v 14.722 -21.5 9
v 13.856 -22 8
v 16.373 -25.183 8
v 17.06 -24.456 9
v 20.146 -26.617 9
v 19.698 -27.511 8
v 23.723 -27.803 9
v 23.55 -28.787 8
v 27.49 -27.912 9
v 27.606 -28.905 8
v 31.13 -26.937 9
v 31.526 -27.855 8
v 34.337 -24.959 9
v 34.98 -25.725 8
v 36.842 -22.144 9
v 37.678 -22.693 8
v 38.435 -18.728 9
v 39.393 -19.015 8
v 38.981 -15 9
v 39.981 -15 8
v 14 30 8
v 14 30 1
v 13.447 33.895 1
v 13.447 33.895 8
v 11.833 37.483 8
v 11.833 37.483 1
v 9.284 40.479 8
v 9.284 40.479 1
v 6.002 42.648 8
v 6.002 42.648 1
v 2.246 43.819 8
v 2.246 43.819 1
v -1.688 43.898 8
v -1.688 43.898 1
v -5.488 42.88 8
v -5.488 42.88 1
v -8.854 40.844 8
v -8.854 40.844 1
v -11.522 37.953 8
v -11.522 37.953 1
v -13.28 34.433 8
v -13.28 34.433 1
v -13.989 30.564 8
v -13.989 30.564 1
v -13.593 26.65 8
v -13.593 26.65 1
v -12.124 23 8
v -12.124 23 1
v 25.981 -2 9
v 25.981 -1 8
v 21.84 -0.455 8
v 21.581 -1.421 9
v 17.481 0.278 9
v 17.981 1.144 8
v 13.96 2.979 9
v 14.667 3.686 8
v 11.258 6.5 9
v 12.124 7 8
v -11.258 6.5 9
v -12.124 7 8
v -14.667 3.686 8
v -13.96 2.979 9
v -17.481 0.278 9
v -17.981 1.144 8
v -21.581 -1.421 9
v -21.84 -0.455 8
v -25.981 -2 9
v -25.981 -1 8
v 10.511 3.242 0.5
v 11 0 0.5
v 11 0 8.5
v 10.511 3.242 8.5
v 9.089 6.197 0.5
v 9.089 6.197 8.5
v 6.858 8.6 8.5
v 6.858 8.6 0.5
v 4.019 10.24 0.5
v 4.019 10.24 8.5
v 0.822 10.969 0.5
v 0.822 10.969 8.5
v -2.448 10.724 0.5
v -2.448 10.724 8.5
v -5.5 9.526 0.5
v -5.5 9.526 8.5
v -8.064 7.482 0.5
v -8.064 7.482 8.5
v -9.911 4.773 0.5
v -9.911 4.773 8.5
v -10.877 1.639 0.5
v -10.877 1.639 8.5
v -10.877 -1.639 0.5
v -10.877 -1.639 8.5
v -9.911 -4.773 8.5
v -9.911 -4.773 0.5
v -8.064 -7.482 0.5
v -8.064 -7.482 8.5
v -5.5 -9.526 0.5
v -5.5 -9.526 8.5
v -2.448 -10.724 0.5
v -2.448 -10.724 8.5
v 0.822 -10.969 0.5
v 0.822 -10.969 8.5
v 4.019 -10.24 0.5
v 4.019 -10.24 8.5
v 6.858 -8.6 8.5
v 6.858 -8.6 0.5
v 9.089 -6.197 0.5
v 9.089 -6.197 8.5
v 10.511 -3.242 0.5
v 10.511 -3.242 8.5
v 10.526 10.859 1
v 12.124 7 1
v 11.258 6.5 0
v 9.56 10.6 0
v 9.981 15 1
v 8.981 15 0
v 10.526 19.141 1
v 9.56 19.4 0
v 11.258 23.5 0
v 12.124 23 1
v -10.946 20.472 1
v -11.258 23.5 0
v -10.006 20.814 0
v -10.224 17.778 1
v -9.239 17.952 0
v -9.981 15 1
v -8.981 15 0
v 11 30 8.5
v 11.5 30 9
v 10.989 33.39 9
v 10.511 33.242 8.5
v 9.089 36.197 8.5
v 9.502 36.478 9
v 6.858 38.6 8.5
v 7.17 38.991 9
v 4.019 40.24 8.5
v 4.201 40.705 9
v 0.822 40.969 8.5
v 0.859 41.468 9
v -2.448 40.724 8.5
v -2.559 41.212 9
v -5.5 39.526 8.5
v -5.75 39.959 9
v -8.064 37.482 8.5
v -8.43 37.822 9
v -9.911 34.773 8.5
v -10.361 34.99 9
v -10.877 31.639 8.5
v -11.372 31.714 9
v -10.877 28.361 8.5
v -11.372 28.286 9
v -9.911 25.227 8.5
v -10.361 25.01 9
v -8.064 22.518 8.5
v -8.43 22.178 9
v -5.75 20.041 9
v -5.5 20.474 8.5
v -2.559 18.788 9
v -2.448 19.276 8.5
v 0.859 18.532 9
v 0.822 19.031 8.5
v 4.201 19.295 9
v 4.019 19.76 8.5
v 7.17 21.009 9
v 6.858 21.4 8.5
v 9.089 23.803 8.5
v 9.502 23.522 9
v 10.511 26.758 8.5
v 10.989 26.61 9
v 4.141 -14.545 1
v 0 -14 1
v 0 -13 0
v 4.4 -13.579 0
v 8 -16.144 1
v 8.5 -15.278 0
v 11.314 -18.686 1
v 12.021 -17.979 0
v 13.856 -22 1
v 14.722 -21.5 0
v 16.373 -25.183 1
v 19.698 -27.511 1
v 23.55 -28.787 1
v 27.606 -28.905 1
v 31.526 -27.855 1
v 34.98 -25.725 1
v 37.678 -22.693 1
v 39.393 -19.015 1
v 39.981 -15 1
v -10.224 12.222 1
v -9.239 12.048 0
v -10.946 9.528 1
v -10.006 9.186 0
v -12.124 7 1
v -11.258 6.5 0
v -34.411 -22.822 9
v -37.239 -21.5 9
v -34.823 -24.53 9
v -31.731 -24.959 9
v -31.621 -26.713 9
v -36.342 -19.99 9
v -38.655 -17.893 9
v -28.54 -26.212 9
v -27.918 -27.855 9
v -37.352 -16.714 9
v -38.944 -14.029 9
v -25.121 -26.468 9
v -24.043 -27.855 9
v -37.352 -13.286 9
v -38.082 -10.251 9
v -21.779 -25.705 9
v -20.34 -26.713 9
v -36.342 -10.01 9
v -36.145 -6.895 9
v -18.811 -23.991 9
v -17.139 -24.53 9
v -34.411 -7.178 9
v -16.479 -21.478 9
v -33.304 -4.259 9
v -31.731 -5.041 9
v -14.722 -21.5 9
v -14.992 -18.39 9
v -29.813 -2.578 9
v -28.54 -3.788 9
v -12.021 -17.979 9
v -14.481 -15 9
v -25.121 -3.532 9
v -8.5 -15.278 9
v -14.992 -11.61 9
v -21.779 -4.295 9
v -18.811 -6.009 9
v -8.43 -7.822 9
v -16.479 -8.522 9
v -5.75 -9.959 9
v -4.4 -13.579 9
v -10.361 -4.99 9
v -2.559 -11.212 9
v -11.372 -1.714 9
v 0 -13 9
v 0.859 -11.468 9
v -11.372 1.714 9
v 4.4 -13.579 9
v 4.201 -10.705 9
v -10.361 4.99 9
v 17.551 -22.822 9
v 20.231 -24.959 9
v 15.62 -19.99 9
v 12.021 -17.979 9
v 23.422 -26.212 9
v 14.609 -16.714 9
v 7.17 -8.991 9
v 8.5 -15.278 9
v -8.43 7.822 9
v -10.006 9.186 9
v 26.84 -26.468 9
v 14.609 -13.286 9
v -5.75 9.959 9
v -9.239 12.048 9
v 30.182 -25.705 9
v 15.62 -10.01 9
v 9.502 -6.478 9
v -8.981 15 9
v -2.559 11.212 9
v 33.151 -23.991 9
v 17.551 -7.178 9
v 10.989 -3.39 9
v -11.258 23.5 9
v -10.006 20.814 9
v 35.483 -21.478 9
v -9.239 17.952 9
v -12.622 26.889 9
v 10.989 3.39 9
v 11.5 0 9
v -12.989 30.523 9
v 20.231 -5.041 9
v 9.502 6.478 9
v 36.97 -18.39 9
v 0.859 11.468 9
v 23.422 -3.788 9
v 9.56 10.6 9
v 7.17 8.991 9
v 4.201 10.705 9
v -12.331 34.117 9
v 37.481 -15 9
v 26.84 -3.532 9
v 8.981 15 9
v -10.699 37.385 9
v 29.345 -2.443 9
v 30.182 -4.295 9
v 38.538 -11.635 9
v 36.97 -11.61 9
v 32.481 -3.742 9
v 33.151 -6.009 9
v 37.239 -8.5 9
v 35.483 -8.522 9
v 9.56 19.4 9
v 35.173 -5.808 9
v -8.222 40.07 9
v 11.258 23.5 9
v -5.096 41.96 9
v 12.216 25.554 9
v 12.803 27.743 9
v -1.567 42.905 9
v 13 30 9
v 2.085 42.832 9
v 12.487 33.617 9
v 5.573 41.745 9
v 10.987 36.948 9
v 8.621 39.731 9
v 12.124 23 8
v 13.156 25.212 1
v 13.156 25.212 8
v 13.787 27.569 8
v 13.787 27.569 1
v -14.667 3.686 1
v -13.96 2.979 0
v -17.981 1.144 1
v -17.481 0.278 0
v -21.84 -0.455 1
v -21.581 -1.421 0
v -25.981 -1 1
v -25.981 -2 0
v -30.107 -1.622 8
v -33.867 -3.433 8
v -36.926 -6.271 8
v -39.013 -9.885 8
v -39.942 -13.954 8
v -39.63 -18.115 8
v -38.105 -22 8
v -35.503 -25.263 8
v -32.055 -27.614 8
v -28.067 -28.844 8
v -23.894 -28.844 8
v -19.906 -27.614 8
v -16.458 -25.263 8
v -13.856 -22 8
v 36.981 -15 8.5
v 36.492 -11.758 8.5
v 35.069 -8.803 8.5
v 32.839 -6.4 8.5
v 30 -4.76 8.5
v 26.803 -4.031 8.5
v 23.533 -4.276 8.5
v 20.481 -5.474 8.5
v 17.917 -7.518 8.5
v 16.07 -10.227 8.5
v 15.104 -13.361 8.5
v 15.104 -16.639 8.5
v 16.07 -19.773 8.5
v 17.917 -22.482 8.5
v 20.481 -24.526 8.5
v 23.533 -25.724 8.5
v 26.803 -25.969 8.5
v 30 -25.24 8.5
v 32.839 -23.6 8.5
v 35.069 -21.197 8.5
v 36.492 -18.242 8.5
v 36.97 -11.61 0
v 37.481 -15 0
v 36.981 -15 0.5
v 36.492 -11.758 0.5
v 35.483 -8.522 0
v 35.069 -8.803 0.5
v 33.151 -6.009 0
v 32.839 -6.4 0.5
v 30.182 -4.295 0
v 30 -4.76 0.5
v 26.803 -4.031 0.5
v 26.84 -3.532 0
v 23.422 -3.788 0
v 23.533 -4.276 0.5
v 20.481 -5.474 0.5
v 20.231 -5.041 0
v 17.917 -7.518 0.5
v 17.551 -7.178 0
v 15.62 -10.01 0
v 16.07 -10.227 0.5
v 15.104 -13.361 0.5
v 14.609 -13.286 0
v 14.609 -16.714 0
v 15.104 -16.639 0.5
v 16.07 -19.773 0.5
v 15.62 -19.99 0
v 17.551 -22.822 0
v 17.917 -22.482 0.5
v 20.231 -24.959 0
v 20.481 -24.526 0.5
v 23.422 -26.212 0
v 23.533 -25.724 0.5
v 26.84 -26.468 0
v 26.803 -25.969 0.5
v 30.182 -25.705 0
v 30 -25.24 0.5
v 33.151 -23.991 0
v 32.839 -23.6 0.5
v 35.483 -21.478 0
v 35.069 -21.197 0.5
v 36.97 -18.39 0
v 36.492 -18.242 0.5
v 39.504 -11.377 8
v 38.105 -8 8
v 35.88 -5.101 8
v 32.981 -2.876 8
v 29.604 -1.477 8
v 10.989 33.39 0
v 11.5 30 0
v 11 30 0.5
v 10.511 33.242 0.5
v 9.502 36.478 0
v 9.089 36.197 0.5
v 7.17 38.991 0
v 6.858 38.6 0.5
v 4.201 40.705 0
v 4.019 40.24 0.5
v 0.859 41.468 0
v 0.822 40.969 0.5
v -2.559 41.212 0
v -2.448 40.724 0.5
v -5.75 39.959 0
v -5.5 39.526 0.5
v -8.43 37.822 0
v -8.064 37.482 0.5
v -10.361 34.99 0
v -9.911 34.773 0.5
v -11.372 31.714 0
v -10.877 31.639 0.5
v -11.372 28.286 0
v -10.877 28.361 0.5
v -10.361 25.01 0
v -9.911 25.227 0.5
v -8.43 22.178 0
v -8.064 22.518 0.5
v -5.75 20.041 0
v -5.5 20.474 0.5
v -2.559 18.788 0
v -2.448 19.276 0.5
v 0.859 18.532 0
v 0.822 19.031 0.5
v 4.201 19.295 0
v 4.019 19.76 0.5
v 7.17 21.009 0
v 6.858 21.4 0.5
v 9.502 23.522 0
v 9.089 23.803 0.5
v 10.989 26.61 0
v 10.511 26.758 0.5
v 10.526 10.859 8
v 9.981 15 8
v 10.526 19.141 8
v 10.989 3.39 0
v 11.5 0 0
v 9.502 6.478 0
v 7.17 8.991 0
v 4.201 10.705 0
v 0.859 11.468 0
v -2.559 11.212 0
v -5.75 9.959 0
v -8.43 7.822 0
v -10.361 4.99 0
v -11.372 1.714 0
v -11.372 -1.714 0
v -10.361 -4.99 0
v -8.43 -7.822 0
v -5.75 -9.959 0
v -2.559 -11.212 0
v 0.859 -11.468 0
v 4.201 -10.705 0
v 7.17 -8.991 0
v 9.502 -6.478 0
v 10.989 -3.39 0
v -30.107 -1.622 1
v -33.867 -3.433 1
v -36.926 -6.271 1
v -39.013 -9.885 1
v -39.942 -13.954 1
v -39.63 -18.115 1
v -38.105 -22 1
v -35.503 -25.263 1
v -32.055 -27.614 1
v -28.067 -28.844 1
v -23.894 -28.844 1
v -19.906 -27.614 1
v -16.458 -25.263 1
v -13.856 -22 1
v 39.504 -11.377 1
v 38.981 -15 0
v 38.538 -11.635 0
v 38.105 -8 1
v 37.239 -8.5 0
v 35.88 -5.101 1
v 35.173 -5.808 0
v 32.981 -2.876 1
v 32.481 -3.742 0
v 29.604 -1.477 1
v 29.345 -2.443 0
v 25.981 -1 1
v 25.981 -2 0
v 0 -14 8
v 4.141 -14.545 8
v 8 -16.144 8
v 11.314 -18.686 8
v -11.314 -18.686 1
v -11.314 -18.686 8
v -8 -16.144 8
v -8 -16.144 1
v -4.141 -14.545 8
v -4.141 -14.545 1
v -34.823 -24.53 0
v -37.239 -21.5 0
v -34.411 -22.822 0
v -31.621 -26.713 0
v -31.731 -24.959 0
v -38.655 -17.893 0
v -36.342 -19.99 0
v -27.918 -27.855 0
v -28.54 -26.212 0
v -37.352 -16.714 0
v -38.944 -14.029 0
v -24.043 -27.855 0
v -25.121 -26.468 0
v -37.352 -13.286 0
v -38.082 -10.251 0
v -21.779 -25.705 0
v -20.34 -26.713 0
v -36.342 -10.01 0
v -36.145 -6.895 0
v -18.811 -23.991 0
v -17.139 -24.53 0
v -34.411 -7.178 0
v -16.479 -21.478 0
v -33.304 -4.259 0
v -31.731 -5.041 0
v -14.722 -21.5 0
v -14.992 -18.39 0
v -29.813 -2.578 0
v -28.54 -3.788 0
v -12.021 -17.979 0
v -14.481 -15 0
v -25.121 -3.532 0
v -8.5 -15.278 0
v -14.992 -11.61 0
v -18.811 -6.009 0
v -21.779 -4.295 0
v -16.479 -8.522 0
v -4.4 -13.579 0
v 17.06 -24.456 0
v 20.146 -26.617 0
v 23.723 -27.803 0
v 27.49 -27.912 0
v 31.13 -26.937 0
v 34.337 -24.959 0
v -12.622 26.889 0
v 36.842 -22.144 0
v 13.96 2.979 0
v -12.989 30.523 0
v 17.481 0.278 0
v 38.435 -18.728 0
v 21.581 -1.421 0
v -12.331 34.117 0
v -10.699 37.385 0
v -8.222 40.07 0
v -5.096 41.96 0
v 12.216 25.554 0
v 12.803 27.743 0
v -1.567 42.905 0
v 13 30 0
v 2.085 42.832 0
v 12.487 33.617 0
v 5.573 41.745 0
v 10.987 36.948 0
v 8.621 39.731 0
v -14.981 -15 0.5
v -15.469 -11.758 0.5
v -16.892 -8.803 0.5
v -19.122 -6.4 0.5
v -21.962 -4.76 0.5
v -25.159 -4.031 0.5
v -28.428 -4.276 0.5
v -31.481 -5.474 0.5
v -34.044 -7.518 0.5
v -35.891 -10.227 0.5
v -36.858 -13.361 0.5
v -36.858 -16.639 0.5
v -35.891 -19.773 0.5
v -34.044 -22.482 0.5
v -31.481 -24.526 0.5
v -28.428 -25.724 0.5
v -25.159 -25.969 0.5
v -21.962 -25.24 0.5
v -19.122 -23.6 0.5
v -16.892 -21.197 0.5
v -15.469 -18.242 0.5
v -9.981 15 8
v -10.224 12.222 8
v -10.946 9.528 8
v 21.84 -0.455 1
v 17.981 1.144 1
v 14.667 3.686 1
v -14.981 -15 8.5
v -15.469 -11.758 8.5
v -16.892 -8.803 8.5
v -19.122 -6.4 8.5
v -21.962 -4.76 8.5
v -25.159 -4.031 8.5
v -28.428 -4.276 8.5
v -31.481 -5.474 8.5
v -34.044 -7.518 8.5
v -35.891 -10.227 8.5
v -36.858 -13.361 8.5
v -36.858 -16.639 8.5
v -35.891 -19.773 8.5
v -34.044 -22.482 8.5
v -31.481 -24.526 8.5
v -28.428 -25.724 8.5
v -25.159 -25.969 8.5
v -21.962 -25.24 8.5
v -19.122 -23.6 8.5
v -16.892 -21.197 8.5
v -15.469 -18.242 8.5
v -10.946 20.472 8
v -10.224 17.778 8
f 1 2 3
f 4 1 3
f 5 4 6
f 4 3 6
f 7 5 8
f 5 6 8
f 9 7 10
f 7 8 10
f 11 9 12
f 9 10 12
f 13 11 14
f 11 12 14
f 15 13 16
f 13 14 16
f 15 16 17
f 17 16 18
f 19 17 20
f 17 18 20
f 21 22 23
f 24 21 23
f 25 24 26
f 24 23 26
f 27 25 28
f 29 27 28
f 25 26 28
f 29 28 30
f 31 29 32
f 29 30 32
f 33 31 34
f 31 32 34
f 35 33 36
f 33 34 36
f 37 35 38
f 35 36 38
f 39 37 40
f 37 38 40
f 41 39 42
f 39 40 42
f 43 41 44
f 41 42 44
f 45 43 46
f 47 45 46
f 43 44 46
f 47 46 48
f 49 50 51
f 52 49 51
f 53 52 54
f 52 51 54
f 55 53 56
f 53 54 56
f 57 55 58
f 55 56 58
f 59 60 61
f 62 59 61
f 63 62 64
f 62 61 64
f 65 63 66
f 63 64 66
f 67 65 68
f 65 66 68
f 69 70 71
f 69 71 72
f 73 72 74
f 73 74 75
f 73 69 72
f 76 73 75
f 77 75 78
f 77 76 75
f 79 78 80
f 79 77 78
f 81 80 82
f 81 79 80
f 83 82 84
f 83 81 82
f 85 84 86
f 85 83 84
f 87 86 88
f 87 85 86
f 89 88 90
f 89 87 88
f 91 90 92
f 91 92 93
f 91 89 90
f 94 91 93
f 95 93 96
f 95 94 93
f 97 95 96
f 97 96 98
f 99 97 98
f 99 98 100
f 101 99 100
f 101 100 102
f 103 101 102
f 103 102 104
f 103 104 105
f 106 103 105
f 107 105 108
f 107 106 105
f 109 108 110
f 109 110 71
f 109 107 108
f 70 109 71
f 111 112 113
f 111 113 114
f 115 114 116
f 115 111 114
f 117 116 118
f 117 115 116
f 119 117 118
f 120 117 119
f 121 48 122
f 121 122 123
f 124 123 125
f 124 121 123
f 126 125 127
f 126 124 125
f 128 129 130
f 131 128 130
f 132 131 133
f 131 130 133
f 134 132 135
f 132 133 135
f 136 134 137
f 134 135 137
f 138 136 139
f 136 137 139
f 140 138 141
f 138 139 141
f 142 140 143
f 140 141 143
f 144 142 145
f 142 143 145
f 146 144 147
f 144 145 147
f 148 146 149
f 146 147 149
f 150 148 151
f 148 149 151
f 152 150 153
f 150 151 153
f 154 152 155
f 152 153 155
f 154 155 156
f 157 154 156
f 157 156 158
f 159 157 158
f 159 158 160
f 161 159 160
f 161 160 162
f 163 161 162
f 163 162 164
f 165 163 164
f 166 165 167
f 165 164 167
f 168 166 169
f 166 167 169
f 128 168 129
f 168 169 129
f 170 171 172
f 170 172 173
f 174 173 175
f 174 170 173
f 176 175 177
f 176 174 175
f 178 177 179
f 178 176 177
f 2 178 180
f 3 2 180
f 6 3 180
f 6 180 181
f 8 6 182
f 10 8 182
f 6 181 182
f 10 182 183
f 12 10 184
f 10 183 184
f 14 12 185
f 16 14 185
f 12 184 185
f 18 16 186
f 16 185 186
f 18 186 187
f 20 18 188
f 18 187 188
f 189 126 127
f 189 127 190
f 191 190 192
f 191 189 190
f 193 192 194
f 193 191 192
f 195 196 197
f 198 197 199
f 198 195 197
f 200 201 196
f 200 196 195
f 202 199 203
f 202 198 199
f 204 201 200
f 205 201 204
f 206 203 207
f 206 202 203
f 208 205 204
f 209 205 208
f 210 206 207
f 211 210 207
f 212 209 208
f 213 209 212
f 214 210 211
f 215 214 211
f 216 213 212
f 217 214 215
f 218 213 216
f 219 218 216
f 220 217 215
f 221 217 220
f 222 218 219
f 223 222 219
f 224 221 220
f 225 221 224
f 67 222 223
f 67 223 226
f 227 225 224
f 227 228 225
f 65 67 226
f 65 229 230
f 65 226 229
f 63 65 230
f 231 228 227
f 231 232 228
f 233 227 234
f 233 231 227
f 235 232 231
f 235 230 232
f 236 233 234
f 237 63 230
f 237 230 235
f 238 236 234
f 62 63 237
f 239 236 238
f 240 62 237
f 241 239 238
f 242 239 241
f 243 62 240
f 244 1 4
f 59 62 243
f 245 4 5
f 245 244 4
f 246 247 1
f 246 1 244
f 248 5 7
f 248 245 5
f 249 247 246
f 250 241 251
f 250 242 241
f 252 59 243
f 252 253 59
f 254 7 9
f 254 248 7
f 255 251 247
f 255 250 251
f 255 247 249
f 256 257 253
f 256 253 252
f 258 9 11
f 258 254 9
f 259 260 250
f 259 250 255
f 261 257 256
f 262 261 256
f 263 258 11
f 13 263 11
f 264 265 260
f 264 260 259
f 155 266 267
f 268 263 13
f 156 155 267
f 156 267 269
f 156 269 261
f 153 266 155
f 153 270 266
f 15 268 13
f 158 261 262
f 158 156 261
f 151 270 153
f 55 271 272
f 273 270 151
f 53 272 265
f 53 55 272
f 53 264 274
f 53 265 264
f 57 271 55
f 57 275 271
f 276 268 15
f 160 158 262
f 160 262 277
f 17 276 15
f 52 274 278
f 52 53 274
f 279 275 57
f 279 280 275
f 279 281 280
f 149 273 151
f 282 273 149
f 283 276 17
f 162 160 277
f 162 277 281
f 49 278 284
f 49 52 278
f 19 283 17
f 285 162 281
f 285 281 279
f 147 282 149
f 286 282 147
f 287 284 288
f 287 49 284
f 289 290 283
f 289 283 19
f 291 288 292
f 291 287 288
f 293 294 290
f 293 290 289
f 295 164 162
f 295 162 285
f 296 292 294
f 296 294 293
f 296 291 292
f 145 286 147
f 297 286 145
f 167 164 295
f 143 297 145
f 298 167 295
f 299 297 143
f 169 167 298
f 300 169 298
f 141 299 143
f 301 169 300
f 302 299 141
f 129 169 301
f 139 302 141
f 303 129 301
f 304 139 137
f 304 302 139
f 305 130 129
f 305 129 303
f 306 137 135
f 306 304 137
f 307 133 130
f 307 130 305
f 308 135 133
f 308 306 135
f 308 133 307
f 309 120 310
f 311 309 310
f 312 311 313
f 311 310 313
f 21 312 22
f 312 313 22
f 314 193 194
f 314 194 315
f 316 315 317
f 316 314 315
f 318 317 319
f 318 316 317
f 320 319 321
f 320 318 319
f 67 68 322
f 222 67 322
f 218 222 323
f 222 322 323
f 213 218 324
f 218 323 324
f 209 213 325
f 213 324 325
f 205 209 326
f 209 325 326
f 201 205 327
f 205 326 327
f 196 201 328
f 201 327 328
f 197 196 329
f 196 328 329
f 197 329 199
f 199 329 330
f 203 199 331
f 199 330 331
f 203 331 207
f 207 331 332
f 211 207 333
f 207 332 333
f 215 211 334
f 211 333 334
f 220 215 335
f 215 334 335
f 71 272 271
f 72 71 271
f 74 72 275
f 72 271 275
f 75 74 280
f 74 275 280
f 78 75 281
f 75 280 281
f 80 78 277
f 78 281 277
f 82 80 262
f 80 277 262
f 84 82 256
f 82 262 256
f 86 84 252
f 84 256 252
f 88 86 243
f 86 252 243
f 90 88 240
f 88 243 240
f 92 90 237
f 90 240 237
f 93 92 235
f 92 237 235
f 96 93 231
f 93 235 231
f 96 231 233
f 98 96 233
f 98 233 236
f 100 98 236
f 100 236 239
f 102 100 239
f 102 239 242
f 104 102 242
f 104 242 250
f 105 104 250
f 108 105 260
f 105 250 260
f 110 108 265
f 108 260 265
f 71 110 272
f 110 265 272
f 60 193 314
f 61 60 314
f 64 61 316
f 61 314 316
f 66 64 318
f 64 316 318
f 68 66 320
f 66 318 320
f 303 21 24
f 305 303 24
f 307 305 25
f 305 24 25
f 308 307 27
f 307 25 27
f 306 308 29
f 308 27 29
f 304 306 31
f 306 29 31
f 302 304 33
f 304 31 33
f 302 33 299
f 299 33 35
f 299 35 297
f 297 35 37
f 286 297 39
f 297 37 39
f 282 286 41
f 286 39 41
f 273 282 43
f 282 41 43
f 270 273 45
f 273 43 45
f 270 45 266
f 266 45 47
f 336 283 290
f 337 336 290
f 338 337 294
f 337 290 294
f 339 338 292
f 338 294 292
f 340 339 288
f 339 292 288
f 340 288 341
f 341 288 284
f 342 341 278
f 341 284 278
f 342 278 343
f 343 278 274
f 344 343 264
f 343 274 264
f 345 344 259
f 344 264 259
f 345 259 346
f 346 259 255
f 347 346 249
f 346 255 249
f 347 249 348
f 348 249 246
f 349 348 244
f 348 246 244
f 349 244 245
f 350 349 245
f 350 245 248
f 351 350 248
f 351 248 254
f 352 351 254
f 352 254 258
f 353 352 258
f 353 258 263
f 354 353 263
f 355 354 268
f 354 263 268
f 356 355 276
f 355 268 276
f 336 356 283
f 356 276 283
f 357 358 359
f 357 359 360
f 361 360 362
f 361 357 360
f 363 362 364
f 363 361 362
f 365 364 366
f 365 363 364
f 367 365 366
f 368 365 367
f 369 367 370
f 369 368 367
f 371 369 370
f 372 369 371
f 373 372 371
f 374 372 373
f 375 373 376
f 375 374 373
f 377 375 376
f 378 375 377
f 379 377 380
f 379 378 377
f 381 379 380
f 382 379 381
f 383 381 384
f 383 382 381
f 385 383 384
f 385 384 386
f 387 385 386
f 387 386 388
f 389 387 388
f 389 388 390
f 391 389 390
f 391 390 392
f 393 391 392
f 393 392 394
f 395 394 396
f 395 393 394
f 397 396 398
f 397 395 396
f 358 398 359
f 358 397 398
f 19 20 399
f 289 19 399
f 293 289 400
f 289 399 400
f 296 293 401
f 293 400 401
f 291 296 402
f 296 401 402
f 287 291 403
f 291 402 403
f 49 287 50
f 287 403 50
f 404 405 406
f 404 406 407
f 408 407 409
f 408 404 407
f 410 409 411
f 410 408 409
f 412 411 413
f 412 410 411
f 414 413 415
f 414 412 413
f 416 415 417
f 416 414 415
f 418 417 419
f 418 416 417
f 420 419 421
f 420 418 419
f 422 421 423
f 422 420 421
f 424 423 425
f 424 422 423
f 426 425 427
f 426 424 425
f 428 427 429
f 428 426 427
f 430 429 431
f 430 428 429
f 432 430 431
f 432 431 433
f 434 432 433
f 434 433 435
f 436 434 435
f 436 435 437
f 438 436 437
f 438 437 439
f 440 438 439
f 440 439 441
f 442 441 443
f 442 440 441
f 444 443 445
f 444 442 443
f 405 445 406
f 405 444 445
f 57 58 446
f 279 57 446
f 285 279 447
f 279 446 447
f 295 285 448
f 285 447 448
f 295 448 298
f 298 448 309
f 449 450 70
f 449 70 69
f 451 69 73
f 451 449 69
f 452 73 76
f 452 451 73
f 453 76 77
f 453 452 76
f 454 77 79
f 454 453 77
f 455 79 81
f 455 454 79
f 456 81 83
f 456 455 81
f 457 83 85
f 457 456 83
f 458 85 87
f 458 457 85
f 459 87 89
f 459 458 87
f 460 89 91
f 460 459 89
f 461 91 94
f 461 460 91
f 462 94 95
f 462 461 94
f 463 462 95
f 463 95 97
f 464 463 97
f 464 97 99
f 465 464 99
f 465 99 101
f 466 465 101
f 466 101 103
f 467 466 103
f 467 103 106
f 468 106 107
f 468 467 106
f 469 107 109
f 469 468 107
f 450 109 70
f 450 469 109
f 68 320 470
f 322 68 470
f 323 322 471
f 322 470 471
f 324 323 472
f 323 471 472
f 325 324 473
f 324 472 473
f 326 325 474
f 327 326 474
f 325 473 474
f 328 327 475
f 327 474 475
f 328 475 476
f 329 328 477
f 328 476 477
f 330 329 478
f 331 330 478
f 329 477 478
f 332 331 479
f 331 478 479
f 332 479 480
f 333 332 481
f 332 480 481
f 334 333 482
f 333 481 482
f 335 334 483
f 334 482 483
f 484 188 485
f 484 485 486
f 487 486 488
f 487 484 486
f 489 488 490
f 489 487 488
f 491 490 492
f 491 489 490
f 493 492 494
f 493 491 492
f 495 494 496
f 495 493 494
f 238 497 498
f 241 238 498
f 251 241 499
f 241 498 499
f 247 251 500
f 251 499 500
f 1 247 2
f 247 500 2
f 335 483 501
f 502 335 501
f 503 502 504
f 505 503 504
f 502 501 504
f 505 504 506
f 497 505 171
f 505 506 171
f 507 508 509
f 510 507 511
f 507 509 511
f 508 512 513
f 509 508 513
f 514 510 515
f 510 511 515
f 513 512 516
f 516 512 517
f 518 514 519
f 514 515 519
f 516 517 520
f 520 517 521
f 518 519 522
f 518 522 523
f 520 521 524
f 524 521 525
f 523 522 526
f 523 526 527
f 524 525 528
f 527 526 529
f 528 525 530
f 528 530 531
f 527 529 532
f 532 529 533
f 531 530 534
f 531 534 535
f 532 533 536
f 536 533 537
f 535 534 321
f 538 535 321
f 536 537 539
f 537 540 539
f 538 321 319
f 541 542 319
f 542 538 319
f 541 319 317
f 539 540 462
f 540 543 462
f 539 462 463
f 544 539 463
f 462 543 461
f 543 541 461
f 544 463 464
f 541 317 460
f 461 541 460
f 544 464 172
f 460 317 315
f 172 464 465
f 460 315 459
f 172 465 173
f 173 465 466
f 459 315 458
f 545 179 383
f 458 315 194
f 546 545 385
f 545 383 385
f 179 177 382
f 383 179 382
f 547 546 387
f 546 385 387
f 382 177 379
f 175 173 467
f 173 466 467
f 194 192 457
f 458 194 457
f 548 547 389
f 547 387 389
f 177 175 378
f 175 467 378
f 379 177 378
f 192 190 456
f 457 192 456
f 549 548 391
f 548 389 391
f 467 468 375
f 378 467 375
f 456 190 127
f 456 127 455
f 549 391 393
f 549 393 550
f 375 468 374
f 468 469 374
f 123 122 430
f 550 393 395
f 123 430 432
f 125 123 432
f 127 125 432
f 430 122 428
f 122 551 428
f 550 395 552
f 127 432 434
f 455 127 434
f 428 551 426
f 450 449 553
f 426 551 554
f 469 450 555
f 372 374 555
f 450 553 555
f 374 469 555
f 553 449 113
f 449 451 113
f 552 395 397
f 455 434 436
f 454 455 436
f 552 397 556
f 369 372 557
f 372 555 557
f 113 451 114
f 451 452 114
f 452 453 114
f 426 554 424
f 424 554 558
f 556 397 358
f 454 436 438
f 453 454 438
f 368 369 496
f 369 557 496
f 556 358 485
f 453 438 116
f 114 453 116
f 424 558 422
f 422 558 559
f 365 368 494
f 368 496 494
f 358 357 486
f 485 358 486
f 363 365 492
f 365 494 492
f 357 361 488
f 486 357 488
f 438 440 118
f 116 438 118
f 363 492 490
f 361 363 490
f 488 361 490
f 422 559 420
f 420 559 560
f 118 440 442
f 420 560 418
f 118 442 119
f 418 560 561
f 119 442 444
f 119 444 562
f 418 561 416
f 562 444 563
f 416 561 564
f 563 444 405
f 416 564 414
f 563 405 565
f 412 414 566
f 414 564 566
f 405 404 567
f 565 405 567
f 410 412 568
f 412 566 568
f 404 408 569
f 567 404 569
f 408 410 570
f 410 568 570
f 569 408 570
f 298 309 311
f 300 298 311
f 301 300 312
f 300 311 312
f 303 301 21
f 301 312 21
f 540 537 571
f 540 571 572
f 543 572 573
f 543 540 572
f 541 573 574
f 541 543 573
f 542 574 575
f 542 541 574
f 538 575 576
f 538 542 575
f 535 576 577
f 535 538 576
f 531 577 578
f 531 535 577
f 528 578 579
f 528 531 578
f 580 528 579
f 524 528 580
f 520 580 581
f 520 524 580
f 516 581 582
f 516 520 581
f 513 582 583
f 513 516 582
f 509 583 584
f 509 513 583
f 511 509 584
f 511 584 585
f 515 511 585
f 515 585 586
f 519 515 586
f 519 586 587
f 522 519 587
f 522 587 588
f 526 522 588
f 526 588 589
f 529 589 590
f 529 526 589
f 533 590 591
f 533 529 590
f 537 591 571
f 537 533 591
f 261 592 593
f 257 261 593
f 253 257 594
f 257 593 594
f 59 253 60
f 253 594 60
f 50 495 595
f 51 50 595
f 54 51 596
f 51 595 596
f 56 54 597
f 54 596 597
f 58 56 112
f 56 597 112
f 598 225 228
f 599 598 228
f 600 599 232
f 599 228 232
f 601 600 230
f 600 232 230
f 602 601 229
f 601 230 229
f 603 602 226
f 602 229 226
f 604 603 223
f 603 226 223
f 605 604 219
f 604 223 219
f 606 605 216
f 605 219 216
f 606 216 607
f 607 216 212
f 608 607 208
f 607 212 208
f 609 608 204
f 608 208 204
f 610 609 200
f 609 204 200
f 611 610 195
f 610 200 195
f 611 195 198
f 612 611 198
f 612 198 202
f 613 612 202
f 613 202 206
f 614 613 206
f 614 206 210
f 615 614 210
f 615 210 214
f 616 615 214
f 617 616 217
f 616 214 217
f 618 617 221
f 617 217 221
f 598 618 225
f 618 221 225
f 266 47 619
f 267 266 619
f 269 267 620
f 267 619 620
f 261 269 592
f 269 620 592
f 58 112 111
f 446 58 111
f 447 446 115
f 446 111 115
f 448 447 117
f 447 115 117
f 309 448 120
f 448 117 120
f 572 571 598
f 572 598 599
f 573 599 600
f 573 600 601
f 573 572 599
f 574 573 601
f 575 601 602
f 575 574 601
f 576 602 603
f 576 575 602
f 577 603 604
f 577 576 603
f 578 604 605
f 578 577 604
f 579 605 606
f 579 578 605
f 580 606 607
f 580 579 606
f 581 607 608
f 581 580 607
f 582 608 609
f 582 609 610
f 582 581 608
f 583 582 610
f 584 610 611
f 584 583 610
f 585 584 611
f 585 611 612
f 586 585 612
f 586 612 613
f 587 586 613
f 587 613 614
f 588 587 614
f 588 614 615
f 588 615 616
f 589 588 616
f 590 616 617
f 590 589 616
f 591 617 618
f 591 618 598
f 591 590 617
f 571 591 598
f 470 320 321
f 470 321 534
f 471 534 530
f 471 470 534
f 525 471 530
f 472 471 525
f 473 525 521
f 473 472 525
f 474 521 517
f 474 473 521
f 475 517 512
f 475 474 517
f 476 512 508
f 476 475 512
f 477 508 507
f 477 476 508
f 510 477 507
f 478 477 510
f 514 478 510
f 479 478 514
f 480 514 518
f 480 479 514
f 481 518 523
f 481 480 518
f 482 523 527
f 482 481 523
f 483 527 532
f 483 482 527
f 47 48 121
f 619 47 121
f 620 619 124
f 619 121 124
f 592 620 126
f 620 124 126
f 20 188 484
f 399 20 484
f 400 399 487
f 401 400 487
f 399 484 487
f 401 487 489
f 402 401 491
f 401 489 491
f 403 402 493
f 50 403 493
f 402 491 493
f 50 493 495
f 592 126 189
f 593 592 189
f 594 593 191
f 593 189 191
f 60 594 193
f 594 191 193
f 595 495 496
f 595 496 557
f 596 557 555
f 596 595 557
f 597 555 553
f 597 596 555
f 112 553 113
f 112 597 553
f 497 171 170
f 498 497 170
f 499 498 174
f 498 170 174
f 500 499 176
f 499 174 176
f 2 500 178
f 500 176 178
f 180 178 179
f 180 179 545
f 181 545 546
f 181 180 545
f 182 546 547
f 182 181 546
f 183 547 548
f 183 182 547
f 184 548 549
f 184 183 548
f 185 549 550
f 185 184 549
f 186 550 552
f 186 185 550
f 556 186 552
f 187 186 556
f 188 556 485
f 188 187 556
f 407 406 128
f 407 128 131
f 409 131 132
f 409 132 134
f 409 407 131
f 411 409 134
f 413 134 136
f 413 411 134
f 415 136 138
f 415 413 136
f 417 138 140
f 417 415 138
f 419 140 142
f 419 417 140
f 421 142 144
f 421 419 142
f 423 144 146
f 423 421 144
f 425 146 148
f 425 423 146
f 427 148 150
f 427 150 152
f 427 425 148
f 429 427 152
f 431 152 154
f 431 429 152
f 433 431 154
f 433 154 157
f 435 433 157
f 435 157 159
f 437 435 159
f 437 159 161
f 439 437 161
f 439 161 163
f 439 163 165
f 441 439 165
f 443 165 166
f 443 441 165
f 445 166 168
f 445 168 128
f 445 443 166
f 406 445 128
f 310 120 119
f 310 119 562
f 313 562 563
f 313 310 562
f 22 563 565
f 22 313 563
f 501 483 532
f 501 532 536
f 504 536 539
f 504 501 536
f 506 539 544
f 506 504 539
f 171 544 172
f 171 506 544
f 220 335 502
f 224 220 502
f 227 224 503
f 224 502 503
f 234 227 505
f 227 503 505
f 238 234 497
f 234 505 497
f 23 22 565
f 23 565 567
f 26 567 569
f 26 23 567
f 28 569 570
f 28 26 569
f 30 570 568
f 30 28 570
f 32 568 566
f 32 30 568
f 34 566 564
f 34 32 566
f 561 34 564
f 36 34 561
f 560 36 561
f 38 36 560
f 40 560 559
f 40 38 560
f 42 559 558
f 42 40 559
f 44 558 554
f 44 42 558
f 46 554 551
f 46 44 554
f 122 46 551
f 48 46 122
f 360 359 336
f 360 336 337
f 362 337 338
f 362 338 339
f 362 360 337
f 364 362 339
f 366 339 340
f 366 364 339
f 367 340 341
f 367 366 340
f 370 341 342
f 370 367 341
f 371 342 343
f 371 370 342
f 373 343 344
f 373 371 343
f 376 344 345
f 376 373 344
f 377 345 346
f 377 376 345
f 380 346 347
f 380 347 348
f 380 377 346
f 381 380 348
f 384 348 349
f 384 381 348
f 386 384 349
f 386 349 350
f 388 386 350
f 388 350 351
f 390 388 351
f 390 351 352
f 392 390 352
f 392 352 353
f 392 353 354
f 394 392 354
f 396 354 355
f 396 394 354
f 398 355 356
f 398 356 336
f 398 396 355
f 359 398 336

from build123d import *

# Parameters (mm, degrees)
F1_R     = 11
F2_DEPTH = 9
F3_SIZE  = 0.5
F4_SIZE  = 1


with BuildPart() as f2:
    # F1 (on Top) → F2 (new body)
    with BuildSketch(Plane.XY):
        with BuildLine():
            ThreePointArc((12.1243558114, 23.0000002745), (13.5229616091, 26.3765335216), (14, 30))
            ThreePointArc((14, 30), (-3.6234666891, 43.5229615526), (-12.1243555933, 22.9999998966))
            ThreePointArc((-12.1243555933, 22.9999998966), (2.181e-07, 16), (12.1243558114, 23.0000002745))
        make_face()
        with Locations((0, 30)):
            Circle(F1_R, mode=Mode.SUBTRACT)
        with BuildLine():
            ThreePointArc((39.9807621135, -15), (35.8802570426, -5.1005050558), (25.9807620921, -1))
            ThreePointArc((25.9807620921, -1), (13.8564063651, -8.0000001654), (13.8564066408, -22.0000003122))
            ThreePointArc((13.8564066408, -22.0000003122), (29.6042289191, -28.5229615214), (39.9807621135, -15))
        make_face()
        with Locations((25.9807621135, -15)):
            Circle(F1_R, mode=Mode.SUBTRACT)
        with BuildLine():
            ThreePointArc((-11.9807621135, -15), (-16.0812671769, -5.1005050634), (-25.9807621135, -1))
            ThreePointArc((-25.9807621135, -1), (-38.105117752, -22.0000000252), (-13.8564064315, -21.9999999496))
            ThreePointArc((-13.8564064315, -21.9999999496), (-12.457800538, -18.6234666034), (-11.9807621135, -15))
        make_face()
        with Locations((-25.9807621135, -15)):
            Circle(F1_R, mode=Mode.SUBTRACT)
        with BuildLine():
            ThreePointArc((-12.1243554957, 7.0000002723), (-17.9807619774, 1.1435936181), (-25.9807621135, -1))
            ThreePointArc((-25.9807621135, -1), (-16.0812671769, -5.1005050634), (-11.9807621135, -15))
            ThreePointArc((-11.9807621135, -15), (-12.457800538, -18.6234666034), (-13.8564064315, -21.9999999496))
            ThreePointArc((-13.8564064315, -21.9999999496), (-7.9999999748, -16.1435935249), (0, -14))
            ThreePointArc((0, -14), (-12.1243557316, -6.9999998638), (-12.1243554957, 7.0000002723))
        make_face()
        with BuildLine():
            ThreePointArc((25.9807620921, -1), (17.9807619484, 1.1435936348), (12.124355473, 7.0000003117))
            ThreePointArc((12.124355473, 7.0000003117), (13.5229615215, 3.6234668052), (14, 0))
            ThreePointArc((14, 0), (9.8994949366, -9.8994949366), (0, -14))
            ThreePointArc((0, -14), (8.0000001561, -16.1435936296), (13.8564066408, -22.0000003122))
            ThreePointArc((13.8564066408, -22.0000003122), (13.8564063651, -8.0000001654), (25.9807620921, -1))
        make_face()
        with BuildLine():
            ThreePointArc((12.1243558114, 23.0000002745), (2.181e-07, 16), (-12.1243555933, 22.9999998966))
            ThreePointArc((-12.1243555933, 22.9999998966), (-10.5259488775, 19.141104664), (-9.9807621135, 15))
            ThreePointArc((-9.9807621135, 15), (-10.5259488522, 10.8588954302), (-12.1243554957, 7.0000002723))
            ThreePointArc((-12.1243554957, 7.0000002723), (-2.27e-08, 14), (12.124355473, 7.0000003117))
            ThreePointArc((12.124355473, 7.0000003117), (9.9807621135, 15.0000003384), (12.1243558114, 23.0000002745))
        make_face()
        with BuildLine():
            ThreePointArc((14, 0), (13.5229615215, 3.6234668052), (12.124355473, 7.0000003117))
            ThreePointArc((12.124355473, 7.0000003117), (-2.27e-08, 14), (-12.1243554957, 7.0000002723))
            ThreePointArc((-12.1243554957, 7.0000002723), (-12.1243557316, -6.9999998638), (0, -14))
            ThreePointArc((0, -14), (9.8994949366, -9.8994949366), (14, 0))
        make_face()
        Circle(F1_R, mode=Mode.SUBTRACT)
    extrude(amount=F2_DEPTH)

    # F3
    f3_edges = [f2.edges().sort_by_distance(p)[0] for p in [
        (-36.980762, -15, 9),
        (-11, 0, 9),
        (-11, 30, 9),
        (14.980762, -15, 9),
        (-36.980762, -15, 0),
        (-11, 0, 0),
        (14.980762, -15, 0),
        (-11, 30, 0),
    ]]
    chamfer(f3_edges, length=F3_SIZE)

    # F4
    f4_edges = [f2.edges().sort_by_distance(p)[0] for p in [
        (-38.105118, -22, 9),
        (0, -14, 9),
        (-12.124356, 7, 9),
        (0, 44, 9),
        (12.124356, 7, 9),
        (38.105118, -22, 9),
        (0, -14, 0),
        (-38.105118, -22, 0),
        (-12.124356, 7, 0),
        (0, 44, 0),
        (12.124356, 7, 0),
        (38.105118, -22, 0),
    ]]
    chamfer(f4_edges, length=F4_SIZE)


solid = f2.part
